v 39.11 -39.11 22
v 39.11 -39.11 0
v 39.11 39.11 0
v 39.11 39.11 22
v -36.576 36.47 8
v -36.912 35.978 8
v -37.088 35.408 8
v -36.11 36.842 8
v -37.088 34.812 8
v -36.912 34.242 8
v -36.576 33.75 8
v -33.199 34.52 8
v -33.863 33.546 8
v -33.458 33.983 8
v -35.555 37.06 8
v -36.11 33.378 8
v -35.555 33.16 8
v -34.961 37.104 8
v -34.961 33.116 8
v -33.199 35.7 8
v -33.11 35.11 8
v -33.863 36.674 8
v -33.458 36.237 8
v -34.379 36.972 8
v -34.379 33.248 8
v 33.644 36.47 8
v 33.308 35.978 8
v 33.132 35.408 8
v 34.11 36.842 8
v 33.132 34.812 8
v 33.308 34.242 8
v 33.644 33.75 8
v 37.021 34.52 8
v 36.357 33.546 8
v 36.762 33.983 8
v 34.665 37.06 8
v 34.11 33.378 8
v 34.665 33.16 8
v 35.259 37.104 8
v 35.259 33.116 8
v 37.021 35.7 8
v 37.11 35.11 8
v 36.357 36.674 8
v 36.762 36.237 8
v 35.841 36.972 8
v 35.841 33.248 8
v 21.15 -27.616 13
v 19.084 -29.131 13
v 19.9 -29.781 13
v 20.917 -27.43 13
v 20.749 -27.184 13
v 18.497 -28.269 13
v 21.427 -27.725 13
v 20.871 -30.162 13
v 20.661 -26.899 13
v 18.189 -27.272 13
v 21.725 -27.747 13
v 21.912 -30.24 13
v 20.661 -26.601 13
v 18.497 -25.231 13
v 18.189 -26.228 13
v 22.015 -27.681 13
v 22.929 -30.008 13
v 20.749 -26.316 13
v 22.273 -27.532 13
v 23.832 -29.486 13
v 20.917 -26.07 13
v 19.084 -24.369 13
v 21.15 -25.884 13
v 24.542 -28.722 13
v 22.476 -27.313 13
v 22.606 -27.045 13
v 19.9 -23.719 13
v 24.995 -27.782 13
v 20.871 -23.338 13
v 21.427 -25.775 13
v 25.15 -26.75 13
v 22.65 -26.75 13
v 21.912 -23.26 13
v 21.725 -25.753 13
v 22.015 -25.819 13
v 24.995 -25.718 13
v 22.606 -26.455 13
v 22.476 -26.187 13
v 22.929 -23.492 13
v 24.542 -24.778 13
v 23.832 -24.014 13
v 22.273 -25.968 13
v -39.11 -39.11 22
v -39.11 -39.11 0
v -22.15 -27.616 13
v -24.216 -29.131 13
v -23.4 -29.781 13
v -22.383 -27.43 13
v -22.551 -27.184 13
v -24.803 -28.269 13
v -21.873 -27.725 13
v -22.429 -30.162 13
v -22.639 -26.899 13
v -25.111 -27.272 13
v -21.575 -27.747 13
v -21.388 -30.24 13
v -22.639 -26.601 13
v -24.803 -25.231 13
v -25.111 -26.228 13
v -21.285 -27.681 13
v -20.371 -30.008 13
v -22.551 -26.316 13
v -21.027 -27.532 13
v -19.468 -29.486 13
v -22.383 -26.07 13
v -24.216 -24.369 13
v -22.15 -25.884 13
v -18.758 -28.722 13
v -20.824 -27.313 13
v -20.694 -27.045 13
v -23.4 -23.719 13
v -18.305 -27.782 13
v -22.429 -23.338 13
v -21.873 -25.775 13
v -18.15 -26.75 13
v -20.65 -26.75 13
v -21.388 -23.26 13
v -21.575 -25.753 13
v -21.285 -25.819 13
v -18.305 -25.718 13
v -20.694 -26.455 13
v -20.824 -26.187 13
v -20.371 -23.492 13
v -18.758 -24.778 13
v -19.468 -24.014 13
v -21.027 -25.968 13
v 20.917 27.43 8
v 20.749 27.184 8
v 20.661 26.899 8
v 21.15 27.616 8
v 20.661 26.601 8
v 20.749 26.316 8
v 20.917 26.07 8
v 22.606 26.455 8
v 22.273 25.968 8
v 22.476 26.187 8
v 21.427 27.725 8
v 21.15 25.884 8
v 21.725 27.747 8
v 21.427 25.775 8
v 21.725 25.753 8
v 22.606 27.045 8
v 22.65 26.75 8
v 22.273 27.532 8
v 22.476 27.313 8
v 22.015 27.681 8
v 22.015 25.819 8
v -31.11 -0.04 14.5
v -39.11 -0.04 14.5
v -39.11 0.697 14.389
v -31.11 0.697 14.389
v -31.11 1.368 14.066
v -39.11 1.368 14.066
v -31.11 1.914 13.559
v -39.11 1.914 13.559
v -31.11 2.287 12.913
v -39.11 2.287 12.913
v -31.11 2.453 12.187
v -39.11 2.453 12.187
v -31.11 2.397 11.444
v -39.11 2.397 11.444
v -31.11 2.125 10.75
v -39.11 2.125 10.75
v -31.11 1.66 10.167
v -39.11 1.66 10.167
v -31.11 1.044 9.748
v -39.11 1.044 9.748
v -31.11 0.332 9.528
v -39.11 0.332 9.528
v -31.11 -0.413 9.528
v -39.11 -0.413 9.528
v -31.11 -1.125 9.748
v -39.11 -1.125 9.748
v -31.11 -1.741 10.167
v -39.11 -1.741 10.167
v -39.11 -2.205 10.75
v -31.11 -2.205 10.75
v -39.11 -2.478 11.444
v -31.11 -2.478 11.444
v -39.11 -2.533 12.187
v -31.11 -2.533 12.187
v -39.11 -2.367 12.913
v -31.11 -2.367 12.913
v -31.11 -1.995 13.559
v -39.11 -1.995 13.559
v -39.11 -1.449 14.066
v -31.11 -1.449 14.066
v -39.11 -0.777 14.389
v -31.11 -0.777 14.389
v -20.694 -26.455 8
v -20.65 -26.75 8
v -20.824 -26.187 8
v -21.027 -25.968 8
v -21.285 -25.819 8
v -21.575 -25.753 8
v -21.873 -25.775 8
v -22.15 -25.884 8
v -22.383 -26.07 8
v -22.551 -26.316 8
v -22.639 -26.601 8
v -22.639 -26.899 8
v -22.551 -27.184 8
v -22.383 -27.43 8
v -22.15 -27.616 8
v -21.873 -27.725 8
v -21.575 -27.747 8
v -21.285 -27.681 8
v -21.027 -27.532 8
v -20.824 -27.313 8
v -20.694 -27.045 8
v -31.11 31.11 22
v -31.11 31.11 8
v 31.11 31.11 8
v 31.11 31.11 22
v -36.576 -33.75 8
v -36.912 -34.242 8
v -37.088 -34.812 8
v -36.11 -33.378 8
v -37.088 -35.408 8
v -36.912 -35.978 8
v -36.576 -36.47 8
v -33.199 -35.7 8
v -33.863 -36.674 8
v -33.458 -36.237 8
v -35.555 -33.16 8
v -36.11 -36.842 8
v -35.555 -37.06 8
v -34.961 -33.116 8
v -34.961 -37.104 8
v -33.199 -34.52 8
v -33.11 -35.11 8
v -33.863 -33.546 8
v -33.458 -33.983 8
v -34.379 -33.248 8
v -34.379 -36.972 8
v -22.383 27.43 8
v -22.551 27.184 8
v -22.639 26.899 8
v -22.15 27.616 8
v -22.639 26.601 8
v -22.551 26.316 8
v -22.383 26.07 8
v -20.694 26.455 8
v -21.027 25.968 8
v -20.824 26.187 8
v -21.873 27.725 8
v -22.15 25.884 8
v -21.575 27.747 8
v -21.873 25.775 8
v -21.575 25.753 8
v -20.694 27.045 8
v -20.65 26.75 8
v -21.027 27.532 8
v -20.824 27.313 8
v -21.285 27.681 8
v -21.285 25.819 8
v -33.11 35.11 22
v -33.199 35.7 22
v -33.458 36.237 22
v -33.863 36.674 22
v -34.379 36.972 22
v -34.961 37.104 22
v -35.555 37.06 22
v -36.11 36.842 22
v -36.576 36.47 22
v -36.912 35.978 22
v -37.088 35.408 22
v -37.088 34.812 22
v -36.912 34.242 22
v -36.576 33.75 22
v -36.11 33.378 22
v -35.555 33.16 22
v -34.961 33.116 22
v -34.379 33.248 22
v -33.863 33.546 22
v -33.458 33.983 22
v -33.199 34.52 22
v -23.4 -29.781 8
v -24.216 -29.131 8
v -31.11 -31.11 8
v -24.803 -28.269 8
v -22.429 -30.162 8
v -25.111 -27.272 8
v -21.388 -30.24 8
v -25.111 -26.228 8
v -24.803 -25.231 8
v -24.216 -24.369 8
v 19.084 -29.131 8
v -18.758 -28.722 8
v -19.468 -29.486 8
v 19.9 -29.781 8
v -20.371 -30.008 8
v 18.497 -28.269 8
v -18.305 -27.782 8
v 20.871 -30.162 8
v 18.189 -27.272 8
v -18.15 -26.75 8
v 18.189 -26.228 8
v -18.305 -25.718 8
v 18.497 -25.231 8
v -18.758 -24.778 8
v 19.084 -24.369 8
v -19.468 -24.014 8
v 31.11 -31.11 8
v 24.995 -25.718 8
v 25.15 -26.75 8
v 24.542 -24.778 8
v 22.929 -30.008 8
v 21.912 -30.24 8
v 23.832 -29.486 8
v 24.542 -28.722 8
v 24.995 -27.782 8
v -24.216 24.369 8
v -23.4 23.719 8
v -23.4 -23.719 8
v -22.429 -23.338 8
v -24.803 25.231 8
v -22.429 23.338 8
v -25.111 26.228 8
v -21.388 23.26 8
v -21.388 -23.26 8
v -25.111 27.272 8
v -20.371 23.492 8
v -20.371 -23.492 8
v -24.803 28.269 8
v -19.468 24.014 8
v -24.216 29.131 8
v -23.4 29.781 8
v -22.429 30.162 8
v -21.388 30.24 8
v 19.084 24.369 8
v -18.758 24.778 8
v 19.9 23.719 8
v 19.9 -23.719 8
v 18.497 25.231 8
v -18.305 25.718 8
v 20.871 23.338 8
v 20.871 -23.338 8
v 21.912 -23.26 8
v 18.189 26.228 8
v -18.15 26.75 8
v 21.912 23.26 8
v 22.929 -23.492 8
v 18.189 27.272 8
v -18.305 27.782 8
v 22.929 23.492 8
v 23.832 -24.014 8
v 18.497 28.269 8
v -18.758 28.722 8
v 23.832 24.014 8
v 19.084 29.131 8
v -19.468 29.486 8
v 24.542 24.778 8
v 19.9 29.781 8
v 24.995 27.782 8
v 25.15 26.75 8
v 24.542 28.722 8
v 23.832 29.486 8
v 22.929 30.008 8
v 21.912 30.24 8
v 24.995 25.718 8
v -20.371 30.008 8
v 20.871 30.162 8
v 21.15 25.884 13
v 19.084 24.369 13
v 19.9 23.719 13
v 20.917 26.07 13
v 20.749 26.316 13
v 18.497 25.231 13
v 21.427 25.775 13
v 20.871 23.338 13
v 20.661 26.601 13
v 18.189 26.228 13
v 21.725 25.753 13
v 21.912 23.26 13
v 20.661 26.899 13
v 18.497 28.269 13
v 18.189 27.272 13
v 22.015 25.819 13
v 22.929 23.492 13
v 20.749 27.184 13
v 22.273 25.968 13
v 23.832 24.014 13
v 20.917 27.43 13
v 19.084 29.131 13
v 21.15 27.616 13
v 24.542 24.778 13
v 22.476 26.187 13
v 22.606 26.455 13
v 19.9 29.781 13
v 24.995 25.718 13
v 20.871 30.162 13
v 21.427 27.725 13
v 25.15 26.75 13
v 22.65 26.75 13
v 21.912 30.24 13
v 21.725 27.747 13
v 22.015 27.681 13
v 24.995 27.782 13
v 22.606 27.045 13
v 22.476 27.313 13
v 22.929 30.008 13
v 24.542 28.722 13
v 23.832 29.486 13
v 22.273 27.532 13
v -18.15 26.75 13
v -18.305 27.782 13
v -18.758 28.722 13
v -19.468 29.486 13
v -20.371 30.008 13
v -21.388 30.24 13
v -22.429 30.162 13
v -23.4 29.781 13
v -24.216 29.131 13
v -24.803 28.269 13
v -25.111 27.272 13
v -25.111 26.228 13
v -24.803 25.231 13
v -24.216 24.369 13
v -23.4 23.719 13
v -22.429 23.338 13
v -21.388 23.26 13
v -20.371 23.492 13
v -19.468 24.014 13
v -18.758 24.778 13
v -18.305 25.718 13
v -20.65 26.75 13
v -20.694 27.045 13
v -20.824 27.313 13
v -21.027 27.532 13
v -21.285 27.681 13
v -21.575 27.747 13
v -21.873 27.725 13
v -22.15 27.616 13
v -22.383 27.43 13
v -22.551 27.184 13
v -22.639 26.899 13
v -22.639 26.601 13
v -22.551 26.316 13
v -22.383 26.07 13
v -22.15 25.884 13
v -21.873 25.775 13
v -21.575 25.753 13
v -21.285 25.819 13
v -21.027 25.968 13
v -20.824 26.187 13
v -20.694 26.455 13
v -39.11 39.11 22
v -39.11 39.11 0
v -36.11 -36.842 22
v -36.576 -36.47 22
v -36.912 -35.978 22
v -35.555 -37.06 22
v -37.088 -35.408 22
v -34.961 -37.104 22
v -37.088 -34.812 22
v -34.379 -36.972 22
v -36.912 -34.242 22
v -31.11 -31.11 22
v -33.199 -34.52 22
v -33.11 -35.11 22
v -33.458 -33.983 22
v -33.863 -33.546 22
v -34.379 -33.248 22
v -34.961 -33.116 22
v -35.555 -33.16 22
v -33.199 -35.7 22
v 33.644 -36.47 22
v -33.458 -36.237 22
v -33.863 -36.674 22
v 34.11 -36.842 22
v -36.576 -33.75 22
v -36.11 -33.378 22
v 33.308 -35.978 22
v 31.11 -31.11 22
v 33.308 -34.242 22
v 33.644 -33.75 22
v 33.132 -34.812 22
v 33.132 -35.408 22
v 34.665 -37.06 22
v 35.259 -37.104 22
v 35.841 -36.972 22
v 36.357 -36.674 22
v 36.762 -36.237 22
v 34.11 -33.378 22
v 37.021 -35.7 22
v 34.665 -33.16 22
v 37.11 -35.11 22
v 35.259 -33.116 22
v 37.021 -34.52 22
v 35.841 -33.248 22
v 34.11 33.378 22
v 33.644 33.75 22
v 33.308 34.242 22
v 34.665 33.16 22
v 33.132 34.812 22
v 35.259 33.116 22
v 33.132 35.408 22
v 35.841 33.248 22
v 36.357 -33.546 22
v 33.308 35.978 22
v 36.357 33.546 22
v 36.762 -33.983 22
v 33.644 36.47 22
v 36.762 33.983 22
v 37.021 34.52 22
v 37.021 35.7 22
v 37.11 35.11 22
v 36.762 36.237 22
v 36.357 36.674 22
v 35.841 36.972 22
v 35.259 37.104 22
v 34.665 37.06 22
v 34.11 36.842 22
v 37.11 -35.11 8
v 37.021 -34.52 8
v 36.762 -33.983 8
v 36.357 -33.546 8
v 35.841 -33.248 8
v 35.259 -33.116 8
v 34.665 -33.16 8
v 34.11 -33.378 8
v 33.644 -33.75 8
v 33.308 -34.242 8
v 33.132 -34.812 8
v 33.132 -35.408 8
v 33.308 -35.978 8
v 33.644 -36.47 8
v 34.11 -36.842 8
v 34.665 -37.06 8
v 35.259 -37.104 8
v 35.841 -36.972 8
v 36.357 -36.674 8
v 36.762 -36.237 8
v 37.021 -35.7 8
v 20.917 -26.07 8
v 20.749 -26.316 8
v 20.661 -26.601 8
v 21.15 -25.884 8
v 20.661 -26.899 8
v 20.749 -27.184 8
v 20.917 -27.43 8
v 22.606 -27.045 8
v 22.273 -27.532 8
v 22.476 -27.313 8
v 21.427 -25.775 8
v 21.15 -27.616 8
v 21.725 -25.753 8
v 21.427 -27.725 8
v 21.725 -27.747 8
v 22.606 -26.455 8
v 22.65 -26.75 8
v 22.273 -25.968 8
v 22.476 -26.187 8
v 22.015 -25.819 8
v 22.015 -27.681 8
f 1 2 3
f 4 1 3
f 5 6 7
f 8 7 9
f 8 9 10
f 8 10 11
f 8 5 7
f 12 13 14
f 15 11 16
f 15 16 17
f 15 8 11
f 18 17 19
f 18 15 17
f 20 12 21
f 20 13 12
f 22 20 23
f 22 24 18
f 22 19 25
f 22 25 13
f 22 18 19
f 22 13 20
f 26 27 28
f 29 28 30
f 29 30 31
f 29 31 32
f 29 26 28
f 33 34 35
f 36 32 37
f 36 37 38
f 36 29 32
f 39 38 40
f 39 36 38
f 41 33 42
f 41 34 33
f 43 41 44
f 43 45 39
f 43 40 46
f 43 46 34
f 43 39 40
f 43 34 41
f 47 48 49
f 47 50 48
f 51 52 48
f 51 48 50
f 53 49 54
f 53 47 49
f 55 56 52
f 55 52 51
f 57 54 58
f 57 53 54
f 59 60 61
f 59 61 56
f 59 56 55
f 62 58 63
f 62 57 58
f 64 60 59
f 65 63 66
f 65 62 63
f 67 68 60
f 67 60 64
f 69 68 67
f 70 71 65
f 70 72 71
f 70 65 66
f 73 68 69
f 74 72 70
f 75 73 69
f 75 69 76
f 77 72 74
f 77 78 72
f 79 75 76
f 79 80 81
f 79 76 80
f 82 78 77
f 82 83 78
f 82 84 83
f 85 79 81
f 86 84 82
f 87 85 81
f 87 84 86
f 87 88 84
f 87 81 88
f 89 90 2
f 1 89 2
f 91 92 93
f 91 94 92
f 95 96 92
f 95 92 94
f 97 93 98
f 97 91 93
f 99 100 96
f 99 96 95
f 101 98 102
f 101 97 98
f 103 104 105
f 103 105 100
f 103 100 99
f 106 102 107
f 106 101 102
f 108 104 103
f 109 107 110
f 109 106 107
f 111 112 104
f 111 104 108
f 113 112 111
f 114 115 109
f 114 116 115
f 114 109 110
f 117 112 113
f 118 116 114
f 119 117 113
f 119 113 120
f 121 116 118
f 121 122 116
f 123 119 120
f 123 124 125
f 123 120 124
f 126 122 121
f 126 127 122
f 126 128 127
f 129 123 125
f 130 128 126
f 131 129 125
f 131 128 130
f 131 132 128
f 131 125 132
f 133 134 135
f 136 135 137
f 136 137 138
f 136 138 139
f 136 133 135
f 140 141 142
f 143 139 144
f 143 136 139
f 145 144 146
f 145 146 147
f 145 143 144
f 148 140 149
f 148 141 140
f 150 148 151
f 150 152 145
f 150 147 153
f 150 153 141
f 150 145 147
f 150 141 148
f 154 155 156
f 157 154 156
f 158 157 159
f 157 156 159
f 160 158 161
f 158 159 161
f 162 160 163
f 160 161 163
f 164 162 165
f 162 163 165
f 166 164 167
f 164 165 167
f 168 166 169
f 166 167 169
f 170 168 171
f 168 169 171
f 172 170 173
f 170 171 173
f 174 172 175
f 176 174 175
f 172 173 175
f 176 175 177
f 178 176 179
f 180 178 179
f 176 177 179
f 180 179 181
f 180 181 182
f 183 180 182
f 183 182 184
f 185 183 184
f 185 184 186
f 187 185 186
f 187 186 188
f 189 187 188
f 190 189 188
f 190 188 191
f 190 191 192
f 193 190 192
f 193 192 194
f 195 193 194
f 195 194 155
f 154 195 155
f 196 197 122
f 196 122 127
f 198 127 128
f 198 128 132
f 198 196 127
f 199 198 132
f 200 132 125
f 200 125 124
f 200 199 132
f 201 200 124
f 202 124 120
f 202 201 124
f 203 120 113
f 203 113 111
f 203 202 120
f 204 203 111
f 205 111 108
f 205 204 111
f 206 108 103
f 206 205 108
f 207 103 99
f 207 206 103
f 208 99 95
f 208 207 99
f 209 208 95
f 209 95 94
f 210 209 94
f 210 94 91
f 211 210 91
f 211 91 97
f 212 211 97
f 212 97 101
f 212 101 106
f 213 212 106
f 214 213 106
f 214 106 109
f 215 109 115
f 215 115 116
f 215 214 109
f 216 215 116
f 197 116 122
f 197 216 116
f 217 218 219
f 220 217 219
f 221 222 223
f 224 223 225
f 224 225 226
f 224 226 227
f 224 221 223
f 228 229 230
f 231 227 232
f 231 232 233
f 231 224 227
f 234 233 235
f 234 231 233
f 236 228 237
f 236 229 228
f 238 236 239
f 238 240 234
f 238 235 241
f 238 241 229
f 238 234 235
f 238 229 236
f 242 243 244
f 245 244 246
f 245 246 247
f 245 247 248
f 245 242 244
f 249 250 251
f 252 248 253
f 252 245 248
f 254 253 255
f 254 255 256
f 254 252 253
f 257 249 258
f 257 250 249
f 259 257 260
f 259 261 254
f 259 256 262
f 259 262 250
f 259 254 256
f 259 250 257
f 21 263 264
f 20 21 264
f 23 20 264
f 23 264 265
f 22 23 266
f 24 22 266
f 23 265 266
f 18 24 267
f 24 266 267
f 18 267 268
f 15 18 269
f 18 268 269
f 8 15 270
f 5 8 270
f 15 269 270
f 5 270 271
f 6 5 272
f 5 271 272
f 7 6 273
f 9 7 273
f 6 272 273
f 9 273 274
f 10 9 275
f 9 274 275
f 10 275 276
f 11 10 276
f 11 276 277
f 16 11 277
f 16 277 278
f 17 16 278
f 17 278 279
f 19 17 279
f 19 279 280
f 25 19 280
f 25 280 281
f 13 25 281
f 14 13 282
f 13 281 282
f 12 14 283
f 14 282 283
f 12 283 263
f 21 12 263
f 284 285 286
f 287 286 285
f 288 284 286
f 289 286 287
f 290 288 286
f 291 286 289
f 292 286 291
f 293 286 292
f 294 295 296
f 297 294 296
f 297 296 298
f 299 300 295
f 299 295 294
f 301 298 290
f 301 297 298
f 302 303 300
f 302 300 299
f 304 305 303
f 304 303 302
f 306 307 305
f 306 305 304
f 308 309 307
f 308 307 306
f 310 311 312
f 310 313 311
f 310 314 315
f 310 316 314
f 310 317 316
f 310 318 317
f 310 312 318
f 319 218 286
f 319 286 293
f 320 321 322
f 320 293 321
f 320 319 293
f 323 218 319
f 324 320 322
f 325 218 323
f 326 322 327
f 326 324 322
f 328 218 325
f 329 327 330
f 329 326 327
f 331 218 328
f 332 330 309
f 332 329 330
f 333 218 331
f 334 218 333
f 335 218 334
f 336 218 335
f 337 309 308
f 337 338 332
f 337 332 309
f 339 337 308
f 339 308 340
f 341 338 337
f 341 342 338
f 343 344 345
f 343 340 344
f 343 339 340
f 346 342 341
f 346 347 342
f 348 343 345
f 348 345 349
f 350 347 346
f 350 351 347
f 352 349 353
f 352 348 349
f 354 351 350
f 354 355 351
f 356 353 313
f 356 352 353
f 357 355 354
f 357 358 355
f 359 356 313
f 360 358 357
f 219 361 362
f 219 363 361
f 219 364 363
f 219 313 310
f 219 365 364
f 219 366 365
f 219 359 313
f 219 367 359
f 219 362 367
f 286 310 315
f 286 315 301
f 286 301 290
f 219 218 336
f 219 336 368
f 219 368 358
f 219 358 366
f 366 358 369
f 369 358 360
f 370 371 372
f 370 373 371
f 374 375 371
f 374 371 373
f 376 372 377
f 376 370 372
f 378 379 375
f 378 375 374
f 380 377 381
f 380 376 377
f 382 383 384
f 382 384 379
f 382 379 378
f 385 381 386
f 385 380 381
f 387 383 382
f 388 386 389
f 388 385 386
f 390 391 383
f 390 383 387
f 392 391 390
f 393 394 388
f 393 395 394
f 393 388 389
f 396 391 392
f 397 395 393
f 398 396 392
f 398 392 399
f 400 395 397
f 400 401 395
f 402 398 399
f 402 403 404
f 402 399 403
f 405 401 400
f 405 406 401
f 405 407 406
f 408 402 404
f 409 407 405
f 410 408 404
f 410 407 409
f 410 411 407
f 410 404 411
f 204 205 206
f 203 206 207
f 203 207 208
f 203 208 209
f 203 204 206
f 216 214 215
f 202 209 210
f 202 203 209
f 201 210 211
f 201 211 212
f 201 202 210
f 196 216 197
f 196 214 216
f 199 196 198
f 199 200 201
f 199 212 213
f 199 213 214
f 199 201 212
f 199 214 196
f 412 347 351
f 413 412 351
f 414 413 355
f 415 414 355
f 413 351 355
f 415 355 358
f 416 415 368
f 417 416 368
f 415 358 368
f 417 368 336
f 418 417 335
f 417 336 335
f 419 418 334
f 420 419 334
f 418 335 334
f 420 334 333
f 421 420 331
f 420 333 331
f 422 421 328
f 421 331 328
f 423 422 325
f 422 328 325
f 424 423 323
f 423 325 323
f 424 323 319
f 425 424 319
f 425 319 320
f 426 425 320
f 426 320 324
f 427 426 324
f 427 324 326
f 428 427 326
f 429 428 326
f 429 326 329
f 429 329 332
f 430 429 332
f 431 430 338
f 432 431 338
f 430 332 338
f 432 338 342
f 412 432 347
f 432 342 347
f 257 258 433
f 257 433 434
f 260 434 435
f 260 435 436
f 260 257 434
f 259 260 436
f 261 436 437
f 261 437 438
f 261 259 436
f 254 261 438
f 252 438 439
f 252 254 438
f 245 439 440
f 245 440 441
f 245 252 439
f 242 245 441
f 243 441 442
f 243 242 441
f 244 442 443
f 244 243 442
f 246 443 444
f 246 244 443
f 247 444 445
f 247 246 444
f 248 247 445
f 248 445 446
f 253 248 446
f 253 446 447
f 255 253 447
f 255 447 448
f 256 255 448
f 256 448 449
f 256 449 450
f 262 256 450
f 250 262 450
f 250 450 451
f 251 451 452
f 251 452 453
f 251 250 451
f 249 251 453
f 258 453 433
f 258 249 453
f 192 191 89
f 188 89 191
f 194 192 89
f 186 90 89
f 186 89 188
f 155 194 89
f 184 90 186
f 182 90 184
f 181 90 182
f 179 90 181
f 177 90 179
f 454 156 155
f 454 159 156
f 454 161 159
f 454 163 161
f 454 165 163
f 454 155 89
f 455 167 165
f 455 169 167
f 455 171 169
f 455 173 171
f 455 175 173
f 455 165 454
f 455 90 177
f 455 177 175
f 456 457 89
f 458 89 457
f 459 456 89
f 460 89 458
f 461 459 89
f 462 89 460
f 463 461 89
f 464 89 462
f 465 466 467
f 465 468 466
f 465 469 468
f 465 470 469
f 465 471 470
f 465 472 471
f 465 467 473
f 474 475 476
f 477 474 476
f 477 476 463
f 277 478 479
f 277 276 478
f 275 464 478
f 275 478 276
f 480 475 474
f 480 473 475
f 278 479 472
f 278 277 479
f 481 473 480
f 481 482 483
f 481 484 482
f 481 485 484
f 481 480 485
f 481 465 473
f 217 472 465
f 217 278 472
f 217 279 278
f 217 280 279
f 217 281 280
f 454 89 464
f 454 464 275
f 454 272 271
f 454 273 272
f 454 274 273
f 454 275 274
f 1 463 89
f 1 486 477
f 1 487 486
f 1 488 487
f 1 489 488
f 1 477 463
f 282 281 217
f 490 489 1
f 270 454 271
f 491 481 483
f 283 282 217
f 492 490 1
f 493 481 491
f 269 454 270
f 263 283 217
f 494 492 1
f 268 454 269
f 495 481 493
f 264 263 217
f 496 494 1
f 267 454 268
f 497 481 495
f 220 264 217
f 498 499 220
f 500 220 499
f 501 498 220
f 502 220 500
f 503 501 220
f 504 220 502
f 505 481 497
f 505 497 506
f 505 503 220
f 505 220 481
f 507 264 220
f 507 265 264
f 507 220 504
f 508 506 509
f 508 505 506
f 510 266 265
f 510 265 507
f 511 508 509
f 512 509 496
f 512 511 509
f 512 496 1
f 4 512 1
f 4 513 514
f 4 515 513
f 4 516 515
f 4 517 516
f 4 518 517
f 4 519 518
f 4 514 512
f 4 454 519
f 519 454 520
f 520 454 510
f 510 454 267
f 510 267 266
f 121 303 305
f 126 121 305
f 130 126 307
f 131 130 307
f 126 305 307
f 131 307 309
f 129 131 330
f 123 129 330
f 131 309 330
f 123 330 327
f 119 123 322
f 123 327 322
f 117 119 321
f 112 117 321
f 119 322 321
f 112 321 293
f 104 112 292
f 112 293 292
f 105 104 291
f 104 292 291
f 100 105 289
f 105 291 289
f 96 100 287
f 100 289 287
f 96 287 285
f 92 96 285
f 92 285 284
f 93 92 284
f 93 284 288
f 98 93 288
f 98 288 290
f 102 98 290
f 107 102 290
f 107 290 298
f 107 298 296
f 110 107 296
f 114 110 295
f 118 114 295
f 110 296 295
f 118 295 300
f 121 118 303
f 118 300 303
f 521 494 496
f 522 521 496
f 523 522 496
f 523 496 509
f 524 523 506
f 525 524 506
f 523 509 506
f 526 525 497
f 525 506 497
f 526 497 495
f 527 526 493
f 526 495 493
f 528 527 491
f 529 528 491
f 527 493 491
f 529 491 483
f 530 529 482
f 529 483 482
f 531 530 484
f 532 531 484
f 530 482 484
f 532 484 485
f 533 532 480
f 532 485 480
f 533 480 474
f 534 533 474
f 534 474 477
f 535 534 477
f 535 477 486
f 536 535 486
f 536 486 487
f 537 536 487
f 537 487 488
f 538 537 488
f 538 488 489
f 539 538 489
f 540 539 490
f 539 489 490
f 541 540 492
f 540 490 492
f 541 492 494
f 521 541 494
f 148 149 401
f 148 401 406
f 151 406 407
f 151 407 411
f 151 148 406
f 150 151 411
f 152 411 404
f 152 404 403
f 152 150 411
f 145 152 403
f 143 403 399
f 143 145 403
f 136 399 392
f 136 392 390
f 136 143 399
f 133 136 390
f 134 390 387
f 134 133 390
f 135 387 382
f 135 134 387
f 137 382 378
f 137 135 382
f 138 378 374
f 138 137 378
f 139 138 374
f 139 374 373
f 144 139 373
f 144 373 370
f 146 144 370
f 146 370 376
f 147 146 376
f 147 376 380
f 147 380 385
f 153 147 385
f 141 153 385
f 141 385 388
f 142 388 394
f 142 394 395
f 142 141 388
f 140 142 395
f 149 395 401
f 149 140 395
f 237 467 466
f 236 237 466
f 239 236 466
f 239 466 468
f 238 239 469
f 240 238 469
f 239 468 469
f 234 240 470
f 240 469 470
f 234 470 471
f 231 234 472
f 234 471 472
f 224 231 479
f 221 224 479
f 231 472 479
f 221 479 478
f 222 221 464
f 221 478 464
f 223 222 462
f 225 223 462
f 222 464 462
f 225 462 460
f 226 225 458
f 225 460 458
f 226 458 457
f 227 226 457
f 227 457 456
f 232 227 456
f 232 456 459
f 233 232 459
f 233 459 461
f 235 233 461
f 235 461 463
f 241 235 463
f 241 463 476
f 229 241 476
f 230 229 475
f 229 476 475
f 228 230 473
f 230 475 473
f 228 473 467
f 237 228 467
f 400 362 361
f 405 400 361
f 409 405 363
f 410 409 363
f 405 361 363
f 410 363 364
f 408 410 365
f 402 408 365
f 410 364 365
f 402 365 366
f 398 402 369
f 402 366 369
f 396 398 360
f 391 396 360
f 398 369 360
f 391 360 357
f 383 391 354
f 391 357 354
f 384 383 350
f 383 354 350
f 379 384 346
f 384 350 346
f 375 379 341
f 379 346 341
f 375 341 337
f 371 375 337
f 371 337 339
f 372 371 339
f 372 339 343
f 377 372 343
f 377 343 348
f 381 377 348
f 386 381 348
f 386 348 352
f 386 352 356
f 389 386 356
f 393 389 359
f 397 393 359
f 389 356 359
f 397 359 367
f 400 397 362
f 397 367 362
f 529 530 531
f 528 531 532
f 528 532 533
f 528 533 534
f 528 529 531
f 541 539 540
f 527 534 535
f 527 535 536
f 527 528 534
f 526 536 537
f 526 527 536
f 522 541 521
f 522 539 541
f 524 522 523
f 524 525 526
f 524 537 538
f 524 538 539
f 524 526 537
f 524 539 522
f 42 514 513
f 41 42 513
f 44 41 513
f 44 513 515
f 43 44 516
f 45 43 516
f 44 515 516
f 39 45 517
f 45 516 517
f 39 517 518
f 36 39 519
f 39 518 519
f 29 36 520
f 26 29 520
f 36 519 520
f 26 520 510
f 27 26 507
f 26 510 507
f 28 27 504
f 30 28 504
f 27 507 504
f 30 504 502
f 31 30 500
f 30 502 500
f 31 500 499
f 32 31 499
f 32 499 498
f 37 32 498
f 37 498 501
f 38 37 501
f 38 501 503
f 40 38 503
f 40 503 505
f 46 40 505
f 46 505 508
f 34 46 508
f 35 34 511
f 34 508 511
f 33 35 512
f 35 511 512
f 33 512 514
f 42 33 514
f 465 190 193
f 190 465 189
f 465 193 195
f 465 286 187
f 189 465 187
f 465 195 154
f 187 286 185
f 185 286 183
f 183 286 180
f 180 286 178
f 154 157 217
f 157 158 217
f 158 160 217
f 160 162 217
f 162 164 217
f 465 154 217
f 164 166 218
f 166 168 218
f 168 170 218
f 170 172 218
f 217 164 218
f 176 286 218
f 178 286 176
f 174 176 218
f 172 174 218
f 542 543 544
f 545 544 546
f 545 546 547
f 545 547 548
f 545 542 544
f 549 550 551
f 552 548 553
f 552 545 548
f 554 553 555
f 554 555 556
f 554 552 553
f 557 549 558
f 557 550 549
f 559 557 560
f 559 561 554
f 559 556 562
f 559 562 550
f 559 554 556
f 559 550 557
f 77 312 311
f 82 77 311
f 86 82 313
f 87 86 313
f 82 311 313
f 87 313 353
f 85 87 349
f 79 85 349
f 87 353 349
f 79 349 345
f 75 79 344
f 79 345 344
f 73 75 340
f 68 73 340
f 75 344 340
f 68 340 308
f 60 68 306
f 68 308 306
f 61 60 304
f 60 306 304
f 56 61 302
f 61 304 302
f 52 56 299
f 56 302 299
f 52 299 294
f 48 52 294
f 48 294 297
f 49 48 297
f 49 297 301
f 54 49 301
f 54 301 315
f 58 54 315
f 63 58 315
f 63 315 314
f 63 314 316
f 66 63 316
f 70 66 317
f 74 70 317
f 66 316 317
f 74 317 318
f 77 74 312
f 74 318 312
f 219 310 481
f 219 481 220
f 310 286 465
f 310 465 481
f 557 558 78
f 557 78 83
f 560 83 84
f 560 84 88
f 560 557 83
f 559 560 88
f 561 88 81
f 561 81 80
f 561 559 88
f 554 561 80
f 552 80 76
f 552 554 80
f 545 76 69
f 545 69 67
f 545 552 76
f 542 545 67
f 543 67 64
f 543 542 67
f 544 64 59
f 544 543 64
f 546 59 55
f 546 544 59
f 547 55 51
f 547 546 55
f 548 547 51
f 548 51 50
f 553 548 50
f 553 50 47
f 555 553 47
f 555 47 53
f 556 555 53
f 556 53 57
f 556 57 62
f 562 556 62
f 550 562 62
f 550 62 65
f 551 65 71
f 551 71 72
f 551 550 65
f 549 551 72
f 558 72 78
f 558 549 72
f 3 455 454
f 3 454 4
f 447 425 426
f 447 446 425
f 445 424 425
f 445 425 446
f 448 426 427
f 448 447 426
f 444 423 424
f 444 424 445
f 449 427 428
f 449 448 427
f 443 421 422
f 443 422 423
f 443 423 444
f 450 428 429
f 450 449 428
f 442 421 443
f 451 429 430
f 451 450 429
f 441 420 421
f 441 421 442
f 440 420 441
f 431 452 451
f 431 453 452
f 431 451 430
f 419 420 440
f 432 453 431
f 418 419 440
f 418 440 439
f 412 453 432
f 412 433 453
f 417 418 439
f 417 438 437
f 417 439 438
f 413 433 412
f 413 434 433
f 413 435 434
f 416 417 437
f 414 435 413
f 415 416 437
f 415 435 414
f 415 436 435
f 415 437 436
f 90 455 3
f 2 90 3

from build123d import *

# Parameters (mm, degrees)
ESQUISSE1_W             = 78.22
ESQUISSE1_H             = 78.22
BOSS_EXTRU_1_DEPTH      = 22
COQUE1_T                = -8
ESQUISSE2_R             = 2
ENL_V_MAT_EXTRU_1_DEPTH = 14
ESQUISSE3_R             = 3.5
BOSS_EXTRU_2_DEPTH      = 5
ESQUISSE3_4_R           = 1
ENL_V_MAT_EXTRU_3_DEPTH = 5
ESQUISSE6_R             = 2.5
ENL_V_MAT_EXTRU_4_DEPTH = 12


with BuildPart() as part:
    # Esquisse1 → Boss.-Extru.1 (new body)
    with BuildSketch(Plane.XY):
        Rectangle(ESQUISSE1_W, ESQUISSE1_H)
    extrude(amount=BOSS_EXTRU_1_DEPTH)

    # Coque1
    coque1_openings = [part.faces().sort_by_distance(p)[0] for p in [
        (0, 0, 22),
    ]]
    offset(amount=COQUE1_T, openings=coque1_openings, kind=Kind.INTERSECTION)

    # Esquisse2 → Enl_v. mat.-Extru.1 (cut)
    with BuildSketch(Plane.XY.offset(22)):
        with Locations((-35.11, 35.11)):
            Circle(ESQUISSE2_R)
        with Locations((35.11, -35.11)):
            Circle(ESQUISSE2_R)
        with Locations((35.11, 35.11)):
            Circle(ESQUISSE2_R)
        with Locations((-35.11, -35.11)):
            Circle(ESQUISSE2_R)
    extrude(amount=-ENL_V_MAT_EXTRU_1_DEPTH, mode=Mode.SUBTRACT)

    # Esquisse3 → Boss.-Extru.2 (add)
    with BuildSketch(Plane.XY.offset(8)):
        with Locations((-21.65, 26.75)):
            Circle(ESQUISSE3_R)
        with Locations((-21.65, -26.75)):
            Circle(ESQUISSE3_R)
        with Locations((21.65, -26.75)):
            Circle(ESQUISSE3_R)
        with Locations((21.65, 26.75)):
            Circle(ESQUISSE3_R)
    extrude(amount=BOSS_EXTRU_2_DEPTH)

    # Esquisse3_4 → Enl_v. mat.-Extru.3 (cut)
    with BuildSketch(Plane.XY.offset(8)):
        with Locations((-21.65, 26.75)):
            Circle(ESQUISSE3_4_R)
        with Locations((-21.65, -26.75)):
            Circle(ESQUISSE3_4_R)
        with Locations((21.65, -26.75)):
            Circle(ESQUISSE3_4_R)
        with Locations((21.65, 26.75)):
            Circle(ESQUISSE3_4_R)
    extrude(amount=ENL_V_MAT_EXTRU_3_DEPTH, mode=Mode.SUBTRACT)

    # Esquisse6 → Enl_v. mat.-Extru.4 (cut)
    with BuildSketch(Plane.ZY.offset(39.11)):
        with Locations((12, -0.040287358)):
            Circle(ESQUISSE6_R)
    extrude(amount=-ENL_V_MAT_EXTRU_4_DEPTH, mode=Mode.SUBTRACT)


solid = part.part
